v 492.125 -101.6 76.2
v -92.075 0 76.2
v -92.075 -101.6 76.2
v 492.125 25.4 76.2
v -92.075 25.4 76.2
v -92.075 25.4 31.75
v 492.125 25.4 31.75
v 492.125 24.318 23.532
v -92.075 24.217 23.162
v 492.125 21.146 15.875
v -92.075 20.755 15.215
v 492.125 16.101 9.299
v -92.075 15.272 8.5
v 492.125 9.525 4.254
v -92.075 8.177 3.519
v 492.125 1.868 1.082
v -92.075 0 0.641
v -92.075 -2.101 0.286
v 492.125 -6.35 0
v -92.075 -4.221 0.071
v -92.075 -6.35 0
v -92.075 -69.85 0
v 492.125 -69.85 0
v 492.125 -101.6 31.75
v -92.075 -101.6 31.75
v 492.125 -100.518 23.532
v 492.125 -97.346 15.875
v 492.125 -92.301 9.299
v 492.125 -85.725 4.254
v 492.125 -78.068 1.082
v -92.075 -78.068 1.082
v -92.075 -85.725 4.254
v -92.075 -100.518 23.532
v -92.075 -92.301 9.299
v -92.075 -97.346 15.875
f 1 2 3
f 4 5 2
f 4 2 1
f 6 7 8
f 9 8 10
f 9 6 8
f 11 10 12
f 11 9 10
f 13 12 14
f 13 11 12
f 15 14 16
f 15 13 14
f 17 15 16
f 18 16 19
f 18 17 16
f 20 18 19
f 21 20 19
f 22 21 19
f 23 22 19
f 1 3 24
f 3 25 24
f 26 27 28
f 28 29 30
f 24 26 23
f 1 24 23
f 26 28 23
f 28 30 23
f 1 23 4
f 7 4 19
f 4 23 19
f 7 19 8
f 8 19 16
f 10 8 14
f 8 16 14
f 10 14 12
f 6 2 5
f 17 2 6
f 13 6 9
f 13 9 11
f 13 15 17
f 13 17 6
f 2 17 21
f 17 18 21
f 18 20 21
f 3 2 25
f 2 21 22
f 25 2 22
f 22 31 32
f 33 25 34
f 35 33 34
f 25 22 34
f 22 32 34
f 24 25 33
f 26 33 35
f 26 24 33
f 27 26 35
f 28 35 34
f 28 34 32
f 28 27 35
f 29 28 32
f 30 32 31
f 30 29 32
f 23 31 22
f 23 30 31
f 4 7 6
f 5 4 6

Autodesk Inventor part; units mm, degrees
ref_plane "YZ Plane" through (0, 0, 0) normal (1, 0, 0) x (0, 1, 0)
ref_plane "XZ Plane" through (0, 0, 0) normal (0, 1, 0) x (-1, 0, 0)
ref_plane "XY Plane" through (0, 0, 0) normal (0, 0, 1) x (1, 0, 0)
sketch "Sketch1" plane through (0, 0, 0) normal (0, 0, 1) x (1, 0, 0)
  line L0 (0, 0) -> (-92.075, 0)
  line L1 (-92.075, 0) -> (-92.075, 25.4)
  line L2 (-92.075, 25.4) -> (-92.075, -101.6)
  line L3 (-92.075, -101.6) -> (492.125, -101.6)
  line L4 (492.125, -101.6) -> (492.125, 25.4)
  line L5 (492.125, 25.4) -> (-92.075, 25.4)
  dimension "d0" = 92.075
  dimension "d1" = 25.4
  dimension "d2" = 127
  dimension "d3" = 0
  dimension "d4" = 584.2
  dimension "d5" = 90
  dimension "d6" = 127
  dimension "d7" = 90
extrude "Extrusion1" add sketch "Sketch1" along normal blind 76.2
fillet "Fillet1" radius 31.75 2 edges at (200.025, 25.4, 0) (200.025, -101.6, 0)
properties part number "BumperFront"
